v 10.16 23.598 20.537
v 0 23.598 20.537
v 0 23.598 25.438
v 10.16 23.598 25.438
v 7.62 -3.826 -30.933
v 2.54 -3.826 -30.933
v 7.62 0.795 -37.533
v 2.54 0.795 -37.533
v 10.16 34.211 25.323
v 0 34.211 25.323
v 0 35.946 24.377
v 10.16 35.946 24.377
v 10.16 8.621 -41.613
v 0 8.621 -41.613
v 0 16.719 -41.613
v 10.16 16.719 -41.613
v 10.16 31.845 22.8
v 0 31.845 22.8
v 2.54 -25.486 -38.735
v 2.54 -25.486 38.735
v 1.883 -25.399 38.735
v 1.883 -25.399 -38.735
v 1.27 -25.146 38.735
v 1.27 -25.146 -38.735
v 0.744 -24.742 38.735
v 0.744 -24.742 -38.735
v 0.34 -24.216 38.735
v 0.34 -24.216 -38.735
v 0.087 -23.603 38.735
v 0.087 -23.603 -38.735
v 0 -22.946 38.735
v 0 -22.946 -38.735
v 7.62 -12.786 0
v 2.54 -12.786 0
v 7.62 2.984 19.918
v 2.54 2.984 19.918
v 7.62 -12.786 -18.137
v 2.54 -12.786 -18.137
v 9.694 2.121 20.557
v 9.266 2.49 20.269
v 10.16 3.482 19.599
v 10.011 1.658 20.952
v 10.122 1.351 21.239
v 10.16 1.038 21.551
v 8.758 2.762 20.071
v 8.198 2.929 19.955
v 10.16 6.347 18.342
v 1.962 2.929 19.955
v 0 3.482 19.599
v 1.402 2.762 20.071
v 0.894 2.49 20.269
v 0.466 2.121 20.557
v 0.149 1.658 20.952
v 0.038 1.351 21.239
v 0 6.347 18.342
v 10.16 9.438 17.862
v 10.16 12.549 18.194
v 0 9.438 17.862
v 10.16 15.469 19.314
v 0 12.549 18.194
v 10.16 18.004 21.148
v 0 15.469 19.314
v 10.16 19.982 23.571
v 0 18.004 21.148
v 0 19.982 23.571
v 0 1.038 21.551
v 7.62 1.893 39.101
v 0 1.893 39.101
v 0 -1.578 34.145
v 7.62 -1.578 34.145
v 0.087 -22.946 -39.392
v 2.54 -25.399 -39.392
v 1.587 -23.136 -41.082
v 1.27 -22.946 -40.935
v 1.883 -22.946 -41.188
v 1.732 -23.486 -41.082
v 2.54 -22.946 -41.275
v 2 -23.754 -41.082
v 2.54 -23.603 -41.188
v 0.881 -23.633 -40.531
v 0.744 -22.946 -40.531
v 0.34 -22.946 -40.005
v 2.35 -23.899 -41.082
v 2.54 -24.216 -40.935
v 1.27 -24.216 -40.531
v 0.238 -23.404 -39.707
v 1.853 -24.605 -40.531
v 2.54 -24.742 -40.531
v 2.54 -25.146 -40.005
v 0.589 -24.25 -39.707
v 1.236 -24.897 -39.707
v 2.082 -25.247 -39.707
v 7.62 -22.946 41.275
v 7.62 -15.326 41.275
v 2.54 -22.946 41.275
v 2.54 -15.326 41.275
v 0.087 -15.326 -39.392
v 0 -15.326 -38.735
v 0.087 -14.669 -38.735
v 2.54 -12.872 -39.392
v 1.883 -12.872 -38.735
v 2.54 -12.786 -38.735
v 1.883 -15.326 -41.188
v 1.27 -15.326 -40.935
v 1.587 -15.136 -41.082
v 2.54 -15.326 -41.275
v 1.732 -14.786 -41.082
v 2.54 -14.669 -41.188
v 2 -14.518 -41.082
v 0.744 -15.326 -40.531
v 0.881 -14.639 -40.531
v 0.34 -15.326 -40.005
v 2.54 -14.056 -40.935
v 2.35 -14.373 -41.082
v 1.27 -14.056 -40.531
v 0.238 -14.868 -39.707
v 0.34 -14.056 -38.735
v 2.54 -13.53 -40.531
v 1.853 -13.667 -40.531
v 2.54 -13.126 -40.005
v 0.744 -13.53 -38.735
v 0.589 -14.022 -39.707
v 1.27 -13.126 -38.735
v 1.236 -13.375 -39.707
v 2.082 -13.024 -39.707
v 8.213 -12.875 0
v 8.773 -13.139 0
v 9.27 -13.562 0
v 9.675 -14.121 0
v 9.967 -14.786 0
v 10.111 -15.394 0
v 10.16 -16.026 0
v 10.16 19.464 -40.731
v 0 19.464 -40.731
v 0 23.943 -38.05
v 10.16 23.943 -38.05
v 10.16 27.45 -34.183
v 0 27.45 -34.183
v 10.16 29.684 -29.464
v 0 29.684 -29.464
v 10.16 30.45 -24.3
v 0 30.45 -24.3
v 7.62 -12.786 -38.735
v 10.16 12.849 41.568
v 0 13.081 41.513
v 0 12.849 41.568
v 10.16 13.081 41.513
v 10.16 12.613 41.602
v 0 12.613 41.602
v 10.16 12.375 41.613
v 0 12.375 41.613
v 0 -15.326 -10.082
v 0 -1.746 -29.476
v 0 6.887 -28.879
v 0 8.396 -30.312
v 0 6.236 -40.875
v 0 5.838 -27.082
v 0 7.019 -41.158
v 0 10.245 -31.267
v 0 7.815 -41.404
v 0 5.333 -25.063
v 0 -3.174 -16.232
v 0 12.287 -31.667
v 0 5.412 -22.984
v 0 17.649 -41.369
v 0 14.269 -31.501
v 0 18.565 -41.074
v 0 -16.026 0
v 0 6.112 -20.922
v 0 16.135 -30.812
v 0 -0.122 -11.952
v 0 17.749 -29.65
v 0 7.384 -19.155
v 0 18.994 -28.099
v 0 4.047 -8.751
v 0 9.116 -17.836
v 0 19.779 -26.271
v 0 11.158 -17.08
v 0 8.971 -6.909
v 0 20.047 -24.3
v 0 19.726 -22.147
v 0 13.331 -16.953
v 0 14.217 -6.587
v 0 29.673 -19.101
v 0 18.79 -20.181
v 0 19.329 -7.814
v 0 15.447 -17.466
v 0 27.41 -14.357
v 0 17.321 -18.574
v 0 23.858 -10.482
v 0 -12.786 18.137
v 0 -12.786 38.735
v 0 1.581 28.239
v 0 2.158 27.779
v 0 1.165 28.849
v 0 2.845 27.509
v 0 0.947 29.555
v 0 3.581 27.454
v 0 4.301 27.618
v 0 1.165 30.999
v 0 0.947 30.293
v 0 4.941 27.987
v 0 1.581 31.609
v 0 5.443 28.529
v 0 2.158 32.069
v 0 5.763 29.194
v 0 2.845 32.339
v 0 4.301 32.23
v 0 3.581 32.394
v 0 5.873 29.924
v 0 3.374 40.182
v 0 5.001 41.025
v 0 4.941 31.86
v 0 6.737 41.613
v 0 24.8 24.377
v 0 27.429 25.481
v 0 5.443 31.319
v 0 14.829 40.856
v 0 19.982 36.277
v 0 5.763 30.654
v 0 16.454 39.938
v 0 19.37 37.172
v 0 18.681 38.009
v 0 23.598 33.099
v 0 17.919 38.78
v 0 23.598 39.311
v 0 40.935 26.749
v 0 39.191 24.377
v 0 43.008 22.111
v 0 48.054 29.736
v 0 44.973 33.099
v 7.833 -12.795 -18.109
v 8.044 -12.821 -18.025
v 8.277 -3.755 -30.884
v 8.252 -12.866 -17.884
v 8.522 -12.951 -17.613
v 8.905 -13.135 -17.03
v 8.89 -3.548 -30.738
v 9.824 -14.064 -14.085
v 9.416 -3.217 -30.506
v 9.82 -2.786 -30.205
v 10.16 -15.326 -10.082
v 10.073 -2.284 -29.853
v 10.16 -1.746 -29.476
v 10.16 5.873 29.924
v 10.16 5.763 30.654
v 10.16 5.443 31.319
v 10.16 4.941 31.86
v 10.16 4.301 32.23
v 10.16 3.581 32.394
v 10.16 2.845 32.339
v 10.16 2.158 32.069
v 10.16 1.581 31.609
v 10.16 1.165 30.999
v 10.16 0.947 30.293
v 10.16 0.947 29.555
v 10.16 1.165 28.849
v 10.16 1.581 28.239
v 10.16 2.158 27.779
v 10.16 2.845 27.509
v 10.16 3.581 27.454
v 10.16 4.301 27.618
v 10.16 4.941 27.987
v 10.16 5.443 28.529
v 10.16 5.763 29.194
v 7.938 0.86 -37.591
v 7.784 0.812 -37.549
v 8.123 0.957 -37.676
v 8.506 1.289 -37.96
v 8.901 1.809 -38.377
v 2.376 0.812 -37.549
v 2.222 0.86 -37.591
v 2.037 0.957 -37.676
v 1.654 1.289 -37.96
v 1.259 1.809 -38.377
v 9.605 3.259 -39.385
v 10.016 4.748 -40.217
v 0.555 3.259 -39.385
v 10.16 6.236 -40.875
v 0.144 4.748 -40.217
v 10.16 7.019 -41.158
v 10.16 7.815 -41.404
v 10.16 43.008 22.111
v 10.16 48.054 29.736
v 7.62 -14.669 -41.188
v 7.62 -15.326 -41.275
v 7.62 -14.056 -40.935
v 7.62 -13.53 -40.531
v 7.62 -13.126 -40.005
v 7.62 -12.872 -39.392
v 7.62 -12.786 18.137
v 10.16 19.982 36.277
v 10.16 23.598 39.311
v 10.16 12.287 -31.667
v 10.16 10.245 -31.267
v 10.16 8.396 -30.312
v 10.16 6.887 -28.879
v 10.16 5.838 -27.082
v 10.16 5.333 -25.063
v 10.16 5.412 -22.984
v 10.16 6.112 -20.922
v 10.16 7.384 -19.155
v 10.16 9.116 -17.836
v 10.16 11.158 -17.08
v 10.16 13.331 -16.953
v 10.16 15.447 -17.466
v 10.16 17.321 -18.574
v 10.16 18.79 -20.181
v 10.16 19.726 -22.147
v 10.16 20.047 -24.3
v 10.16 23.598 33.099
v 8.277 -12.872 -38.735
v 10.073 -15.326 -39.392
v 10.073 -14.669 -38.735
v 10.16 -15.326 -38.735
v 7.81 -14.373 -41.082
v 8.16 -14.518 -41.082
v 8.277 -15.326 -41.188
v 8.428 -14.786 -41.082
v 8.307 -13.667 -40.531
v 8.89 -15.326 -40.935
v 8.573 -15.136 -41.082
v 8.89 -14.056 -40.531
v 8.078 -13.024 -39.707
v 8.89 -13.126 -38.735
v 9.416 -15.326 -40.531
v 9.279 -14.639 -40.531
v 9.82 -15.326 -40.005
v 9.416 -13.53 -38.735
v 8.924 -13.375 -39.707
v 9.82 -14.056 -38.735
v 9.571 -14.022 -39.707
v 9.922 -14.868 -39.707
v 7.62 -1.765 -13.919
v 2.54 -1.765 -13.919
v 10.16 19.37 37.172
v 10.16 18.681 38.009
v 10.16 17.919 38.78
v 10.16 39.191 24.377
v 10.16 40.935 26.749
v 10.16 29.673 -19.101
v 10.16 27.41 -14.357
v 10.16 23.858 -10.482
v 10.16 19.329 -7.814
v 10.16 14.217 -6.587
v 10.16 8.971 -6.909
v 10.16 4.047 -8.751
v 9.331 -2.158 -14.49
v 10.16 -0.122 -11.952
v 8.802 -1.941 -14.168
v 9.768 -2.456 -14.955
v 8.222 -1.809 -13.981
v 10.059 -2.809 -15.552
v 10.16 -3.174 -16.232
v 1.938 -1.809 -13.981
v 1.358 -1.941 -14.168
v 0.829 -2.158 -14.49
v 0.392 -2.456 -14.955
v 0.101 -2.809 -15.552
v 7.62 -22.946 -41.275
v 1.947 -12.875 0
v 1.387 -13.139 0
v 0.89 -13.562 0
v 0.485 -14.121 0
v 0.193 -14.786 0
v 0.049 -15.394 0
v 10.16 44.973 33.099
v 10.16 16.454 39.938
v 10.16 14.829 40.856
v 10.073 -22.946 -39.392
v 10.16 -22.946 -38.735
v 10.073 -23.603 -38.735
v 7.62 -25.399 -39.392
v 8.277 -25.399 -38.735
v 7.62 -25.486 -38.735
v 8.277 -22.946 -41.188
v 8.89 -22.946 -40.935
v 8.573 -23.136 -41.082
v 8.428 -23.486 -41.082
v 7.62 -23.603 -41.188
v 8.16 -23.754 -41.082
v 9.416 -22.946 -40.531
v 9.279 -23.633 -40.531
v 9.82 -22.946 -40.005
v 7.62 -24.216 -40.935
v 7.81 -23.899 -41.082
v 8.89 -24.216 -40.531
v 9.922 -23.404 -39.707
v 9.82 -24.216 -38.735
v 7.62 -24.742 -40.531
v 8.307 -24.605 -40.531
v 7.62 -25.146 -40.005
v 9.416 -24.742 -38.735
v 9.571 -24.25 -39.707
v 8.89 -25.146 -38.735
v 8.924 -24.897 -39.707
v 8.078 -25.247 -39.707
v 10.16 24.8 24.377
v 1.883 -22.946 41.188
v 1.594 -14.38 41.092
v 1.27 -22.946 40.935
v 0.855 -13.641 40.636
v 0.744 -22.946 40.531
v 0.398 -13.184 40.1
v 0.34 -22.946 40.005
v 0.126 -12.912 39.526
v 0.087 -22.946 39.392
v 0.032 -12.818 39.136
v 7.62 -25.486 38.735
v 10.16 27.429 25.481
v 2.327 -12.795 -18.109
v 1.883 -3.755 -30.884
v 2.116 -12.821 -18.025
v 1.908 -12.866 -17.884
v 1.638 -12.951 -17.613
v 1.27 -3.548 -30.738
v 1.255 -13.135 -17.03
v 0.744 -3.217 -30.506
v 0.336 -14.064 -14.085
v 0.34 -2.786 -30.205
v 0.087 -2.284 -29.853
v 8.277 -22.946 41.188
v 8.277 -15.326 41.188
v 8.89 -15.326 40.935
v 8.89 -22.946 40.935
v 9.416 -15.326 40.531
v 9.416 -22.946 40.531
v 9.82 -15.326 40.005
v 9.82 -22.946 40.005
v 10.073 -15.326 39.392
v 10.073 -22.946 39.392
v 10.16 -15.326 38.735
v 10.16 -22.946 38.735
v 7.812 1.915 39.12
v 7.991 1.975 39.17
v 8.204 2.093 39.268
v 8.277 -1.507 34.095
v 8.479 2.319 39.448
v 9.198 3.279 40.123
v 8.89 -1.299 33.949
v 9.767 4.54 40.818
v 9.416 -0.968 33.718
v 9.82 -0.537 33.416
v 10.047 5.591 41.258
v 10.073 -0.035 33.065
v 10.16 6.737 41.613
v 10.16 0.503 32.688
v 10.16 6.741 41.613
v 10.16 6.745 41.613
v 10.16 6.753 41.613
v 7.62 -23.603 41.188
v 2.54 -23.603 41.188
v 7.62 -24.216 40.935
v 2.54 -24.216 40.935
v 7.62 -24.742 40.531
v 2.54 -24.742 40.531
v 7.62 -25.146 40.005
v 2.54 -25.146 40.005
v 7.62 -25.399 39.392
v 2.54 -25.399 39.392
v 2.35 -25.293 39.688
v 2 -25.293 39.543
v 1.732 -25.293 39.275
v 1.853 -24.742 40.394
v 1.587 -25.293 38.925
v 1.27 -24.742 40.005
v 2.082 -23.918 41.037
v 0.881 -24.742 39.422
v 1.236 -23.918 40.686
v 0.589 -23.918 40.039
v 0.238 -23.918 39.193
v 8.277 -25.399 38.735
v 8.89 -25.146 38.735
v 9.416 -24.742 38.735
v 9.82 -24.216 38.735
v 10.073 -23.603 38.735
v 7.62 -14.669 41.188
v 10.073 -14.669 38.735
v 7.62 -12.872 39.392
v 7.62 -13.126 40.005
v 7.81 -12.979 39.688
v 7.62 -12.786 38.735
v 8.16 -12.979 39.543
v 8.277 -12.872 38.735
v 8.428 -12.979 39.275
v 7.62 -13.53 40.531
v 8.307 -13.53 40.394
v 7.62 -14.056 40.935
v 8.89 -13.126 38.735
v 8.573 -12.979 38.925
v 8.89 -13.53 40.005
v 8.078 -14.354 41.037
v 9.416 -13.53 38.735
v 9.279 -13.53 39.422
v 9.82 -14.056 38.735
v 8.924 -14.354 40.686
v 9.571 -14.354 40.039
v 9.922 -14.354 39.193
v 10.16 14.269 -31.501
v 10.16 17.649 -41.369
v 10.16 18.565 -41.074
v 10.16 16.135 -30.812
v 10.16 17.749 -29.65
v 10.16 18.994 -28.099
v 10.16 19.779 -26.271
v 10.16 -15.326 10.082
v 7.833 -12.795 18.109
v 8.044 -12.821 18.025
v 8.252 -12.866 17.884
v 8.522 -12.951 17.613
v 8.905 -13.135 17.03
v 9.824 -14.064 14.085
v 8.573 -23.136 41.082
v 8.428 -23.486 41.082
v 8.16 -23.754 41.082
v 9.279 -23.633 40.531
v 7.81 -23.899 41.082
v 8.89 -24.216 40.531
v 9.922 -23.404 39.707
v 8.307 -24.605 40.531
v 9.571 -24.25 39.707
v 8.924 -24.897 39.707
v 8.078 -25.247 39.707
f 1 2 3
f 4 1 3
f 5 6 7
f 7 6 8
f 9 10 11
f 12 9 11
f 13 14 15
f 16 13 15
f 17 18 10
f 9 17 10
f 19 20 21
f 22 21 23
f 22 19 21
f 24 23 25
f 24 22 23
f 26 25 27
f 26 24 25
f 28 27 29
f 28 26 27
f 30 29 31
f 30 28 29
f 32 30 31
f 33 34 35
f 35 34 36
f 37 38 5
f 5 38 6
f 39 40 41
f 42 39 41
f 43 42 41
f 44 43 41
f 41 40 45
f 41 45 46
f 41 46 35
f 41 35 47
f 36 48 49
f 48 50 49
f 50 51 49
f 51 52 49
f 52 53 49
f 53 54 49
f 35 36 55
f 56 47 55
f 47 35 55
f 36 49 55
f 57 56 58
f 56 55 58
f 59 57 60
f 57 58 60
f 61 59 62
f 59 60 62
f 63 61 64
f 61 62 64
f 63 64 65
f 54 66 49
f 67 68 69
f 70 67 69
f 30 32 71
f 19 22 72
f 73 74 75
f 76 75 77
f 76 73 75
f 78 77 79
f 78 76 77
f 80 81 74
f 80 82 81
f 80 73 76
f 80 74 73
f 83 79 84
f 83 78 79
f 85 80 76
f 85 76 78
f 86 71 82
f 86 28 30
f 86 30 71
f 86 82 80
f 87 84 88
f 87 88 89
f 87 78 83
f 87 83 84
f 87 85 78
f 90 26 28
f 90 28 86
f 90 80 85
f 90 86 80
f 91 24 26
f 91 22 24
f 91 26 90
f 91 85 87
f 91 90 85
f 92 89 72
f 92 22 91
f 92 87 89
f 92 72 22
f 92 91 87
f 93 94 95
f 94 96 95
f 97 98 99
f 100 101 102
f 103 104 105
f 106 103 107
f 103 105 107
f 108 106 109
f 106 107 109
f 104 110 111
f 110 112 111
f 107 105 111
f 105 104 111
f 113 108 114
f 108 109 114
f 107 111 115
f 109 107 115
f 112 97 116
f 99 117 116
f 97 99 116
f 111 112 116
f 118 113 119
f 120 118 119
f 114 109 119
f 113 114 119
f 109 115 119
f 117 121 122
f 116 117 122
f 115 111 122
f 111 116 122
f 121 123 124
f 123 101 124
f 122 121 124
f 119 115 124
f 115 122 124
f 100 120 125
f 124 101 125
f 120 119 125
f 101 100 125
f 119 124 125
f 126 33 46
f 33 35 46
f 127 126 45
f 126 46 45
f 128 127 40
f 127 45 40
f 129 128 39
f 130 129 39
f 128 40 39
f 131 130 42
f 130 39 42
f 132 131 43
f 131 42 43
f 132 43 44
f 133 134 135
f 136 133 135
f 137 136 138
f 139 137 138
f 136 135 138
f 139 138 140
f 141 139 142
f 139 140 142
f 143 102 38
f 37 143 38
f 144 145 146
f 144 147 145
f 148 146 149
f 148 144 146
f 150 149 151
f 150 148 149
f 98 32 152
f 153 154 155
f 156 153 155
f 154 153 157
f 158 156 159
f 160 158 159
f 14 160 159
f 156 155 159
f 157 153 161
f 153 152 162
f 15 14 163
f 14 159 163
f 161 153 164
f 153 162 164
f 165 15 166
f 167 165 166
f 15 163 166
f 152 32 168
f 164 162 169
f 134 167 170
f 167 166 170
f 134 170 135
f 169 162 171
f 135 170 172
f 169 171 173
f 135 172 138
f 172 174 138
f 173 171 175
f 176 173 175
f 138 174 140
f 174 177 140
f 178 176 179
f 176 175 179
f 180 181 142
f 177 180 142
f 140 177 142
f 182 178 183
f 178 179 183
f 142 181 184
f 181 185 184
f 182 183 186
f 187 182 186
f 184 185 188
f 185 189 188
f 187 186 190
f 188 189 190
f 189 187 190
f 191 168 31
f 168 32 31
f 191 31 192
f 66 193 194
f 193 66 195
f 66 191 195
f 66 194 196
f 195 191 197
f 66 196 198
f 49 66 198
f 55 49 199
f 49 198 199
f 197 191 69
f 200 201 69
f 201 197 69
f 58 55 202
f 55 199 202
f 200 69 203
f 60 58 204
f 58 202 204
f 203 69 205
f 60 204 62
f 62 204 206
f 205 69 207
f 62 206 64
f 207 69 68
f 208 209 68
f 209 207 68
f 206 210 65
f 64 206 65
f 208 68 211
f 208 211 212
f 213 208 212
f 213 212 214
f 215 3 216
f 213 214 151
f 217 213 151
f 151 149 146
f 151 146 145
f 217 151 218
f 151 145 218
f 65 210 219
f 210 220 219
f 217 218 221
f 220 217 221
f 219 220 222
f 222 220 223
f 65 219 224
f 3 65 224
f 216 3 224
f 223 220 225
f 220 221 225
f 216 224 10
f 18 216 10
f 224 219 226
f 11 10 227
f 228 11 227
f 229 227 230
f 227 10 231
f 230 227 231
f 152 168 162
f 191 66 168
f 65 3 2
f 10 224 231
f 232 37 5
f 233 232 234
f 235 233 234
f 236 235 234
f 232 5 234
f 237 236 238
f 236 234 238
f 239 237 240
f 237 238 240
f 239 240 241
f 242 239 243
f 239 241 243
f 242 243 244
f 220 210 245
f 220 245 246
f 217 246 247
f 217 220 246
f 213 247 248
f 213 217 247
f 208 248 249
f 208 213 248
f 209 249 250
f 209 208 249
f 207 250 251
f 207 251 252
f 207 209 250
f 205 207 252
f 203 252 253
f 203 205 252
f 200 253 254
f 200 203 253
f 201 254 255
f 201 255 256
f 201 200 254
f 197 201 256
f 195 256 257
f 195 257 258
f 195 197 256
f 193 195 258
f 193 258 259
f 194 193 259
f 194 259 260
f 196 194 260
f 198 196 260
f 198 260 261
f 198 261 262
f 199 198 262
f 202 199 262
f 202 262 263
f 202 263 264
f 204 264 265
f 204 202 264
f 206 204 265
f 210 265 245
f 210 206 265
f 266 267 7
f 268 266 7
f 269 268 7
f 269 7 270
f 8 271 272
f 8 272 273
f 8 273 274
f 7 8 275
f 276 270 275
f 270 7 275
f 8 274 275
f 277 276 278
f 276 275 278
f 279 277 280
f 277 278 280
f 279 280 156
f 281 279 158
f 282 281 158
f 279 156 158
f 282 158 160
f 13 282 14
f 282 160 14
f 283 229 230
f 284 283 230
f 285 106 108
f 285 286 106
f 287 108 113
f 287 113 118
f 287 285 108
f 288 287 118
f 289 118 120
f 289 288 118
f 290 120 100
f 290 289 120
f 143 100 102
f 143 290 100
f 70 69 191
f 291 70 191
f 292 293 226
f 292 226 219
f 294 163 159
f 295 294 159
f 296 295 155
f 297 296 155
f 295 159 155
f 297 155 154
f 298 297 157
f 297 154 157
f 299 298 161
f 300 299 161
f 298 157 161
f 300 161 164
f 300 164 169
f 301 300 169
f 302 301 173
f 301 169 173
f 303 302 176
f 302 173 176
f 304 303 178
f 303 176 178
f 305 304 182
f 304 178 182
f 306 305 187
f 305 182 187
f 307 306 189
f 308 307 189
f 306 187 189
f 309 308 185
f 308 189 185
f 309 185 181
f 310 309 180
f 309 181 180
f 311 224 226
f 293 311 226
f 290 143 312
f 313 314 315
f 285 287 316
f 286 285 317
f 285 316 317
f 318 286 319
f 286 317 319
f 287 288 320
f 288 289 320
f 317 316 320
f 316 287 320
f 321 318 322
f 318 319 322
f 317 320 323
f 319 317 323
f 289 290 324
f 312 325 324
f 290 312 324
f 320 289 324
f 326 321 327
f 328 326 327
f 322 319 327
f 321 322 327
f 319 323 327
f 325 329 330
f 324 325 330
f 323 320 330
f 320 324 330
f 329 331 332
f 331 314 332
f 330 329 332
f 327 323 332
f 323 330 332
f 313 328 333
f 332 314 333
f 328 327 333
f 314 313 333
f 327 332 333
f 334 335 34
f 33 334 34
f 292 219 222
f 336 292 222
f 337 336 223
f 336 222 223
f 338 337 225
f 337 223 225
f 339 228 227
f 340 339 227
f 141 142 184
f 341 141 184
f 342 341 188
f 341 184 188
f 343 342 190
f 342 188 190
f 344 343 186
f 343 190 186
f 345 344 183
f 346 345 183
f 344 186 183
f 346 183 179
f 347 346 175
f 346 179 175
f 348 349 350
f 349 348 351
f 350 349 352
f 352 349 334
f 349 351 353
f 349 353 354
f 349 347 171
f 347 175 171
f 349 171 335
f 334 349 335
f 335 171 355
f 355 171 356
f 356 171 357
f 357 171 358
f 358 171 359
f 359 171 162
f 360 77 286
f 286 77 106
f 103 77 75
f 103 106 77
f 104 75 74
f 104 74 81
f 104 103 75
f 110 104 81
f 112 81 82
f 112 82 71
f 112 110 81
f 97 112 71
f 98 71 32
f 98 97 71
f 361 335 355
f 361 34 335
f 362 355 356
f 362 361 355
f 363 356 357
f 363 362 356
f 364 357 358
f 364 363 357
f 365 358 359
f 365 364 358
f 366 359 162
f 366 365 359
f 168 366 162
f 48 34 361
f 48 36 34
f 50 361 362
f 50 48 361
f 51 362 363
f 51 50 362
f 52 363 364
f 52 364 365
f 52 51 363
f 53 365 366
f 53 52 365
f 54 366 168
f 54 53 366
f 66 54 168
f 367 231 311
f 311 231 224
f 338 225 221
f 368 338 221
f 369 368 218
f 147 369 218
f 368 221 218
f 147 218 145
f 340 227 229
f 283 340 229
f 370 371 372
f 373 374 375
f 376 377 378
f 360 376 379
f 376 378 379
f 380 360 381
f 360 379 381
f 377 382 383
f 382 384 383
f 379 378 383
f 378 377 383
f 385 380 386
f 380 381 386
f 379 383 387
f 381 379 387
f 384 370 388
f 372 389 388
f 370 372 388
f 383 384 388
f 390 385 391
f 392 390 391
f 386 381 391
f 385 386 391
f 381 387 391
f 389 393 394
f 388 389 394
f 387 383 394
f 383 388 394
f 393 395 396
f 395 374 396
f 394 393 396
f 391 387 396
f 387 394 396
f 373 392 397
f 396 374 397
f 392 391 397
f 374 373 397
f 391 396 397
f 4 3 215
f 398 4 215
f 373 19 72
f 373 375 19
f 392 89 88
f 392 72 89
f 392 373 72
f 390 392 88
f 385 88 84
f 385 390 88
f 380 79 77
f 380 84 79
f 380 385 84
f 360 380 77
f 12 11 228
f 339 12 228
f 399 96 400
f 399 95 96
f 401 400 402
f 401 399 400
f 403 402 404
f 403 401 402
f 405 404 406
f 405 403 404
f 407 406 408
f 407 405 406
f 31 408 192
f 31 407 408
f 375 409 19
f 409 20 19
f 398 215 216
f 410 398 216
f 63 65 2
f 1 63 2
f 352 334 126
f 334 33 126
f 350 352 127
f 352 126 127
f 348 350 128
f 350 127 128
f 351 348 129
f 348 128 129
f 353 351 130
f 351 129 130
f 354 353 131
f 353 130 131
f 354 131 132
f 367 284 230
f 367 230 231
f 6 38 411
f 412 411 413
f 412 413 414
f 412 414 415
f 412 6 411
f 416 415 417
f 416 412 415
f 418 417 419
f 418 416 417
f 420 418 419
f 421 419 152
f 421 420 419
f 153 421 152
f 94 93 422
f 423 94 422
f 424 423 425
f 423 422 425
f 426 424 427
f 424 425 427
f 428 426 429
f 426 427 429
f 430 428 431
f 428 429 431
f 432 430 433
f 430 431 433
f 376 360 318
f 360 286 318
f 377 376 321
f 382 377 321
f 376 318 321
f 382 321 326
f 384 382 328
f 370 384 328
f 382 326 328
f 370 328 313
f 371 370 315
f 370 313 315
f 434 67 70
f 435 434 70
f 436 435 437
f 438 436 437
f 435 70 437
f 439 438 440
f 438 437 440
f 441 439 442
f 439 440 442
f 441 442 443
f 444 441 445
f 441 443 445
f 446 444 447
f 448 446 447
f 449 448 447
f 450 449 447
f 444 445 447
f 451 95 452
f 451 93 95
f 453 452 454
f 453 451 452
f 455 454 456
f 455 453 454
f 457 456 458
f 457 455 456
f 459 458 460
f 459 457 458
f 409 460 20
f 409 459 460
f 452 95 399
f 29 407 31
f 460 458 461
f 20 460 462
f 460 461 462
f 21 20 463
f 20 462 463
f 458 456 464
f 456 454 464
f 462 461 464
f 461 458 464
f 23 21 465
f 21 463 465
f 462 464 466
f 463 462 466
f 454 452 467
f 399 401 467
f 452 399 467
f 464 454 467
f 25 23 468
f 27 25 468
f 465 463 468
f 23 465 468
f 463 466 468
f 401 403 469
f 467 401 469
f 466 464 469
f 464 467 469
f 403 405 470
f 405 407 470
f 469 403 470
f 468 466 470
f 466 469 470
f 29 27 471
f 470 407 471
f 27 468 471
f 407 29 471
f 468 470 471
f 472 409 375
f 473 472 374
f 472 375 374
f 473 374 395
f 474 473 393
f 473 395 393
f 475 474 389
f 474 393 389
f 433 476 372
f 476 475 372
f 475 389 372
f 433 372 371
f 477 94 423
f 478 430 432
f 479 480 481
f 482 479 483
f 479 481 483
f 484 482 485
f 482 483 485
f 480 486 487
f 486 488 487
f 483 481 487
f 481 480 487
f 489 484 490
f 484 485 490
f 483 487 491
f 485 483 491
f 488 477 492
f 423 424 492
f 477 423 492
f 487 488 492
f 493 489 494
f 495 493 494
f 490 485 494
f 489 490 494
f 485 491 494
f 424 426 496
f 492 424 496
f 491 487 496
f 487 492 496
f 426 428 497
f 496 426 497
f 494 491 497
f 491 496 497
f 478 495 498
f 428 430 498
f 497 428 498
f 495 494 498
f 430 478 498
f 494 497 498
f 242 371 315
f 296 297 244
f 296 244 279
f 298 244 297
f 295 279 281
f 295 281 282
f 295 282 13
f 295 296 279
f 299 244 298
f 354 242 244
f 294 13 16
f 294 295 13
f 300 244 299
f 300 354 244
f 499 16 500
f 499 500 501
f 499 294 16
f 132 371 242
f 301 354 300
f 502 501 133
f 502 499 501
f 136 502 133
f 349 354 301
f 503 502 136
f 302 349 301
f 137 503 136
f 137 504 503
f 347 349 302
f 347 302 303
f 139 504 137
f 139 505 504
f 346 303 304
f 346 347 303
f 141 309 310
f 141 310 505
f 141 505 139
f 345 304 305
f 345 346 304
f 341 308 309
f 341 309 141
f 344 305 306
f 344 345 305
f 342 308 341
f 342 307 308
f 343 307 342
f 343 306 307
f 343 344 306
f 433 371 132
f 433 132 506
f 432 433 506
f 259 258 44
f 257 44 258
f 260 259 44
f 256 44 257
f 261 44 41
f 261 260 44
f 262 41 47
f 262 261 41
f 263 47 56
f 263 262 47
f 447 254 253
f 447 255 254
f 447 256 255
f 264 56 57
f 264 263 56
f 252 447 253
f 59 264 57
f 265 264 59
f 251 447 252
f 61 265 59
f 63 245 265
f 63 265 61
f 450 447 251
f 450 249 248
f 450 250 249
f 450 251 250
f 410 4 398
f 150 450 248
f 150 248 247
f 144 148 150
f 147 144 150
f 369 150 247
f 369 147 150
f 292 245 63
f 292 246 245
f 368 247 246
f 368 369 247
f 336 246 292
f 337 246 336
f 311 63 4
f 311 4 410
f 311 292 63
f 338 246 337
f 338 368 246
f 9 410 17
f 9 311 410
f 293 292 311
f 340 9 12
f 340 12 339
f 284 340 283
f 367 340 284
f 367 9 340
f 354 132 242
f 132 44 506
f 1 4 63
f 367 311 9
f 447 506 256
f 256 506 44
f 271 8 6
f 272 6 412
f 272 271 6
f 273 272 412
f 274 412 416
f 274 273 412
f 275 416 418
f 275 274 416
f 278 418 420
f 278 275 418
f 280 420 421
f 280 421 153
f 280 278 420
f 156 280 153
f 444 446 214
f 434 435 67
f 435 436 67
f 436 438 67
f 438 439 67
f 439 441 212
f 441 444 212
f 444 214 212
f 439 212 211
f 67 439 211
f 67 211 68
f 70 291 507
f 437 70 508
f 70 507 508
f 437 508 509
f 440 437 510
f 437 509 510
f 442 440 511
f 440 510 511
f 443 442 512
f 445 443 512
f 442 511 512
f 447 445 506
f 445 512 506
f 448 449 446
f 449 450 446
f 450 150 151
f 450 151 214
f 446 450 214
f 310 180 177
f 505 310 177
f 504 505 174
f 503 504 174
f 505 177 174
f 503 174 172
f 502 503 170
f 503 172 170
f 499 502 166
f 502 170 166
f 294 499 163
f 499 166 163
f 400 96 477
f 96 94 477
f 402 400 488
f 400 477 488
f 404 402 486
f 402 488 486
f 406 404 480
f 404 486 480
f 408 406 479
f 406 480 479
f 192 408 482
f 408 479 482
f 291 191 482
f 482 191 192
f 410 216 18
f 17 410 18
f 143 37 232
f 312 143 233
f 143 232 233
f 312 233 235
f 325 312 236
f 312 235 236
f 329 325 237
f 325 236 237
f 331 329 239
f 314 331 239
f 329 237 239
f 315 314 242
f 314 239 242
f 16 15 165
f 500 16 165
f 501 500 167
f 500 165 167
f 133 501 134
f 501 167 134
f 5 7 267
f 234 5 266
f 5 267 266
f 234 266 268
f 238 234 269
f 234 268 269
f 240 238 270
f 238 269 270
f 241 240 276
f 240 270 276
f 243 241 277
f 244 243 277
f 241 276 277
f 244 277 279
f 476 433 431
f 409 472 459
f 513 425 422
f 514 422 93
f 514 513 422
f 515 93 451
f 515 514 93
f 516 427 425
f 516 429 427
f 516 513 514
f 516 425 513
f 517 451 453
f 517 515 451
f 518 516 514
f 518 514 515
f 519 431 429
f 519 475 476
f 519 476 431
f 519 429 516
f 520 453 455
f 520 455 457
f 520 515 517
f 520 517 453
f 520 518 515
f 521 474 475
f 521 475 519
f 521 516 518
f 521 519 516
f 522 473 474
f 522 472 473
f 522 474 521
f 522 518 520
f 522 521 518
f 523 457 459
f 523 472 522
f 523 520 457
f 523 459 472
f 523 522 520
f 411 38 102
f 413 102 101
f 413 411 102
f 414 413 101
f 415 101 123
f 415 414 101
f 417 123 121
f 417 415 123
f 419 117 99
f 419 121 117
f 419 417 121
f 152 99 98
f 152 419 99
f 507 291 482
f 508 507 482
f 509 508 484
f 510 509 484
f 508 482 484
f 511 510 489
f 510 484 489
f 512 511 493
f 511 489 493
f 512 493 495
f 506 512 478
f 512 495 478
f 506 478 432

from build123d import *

# Parameters (mm, degrees)
F0_R     = 2.476830384
F0_W     = 1.4847664508
F0_H     = 6.35
F1_DEPTH = 10.16
F2_R     = 2.54


with BuildPart() as f1:
    # F0 (on Right) → F1 (new body)
    with BuildSketch(Plane.YZ):
        Polygon((-12.7859174941, 41.275), (-25.4859174941, 41.275), (-25.4859174941, 0), (-12.7859174941, 18.1374796856), align=None)
        Polygon((-12.7859174941, 18.1374796856), (-25.4859174941, 0), (-12.7859174941, -18.1374796856), (-12.7859174941, 0), align=None)
        with BuildLine():
            Line((-12.7859174941, 0), (-12.7859174941, -18.1374796856))
            Line((-12.7859174941, -18.1374796856), (-3.8262820868, -30.9331651338))
            ThreePointArc((-3.8262820868, -30.9331651338), (-4.9808453905, -22.1615497886), (-1.7649908775, -13.9194304048))
            Line((-1.7649908775, -13.9194304048), (-12.7859174941, 0))
        make_face()
        Polygon((-12.7859174941, -18.1374796856), (-25.4859174941, 0), (-25.4859174941, -41.275), (-12.7859174941, -41.275), align=None)
        with BuildLine():
            ThreePointArc((-1.7649908775, -13.9194304048), (-4.9808453905, -22.1615497886), (-3.8262820868, -30.9331651338))
            Line((-3.8262820868, -30.9331651338), (0.7948947361, -37.5328896022))
            ThreePointArc((0.7948947361, -37.5328896022), (4.4509166454, -40.0662604083), (8.6213238247, -41.6129238499))
            Line((8.6213238247, -41.6129238499), (16.7188414486, -41.6129238499))
            ThreePointArc((16.7188414486, -41.6129238499), (18.1090826399, -41.2277000329), (19.4635172648, -40.731036358))
            Line((19.4635172648, -40.731036358), (12.2868024965, -31.6668455484))
            ThreePointArc((12.2868024965, -31.6668455484), (6.8866357903, -28.8791743085), (5.4117238908, -22.9836212144))
            Line((5.4117238908, -22.9836212144), (-1.7649908775, -13.9194304048))
        make_face()
        with BuildLine():
            ThreePointArc((30.4500826367, -24.300039859), (18.1231915168, -7.3769194747), (-1.7649908775, -13.9194304048))
            Line((-1.7649908775, -13.9194304048), (5.4117238908, -22.9836212144))
            ThreePointArc((5.4117238908, -22.9836212144), (13.3309493362, -16.9529326094), (20.0468522367, -24.300039859))
            ThreePointArc((20.0468522367, -24.300039859), (17.7489289843, -29.6499977568), (12.2868024965, -31.6668455484))
            Line((12.2868024965, -31.6668455484), (19.4635172648, -40.731036358))
            ThreePointArc((19.4635172648, -40.731036358), (27.4504017754, -34.182881867), (30.4500826367, -24.300039859))
        make_face()
        with BuildLine():
            Line((-1.5775528515, 34.1446833088), (-12.7859174941, 18.1374796856))
            Line((-12.7859174941, 18.1374796856), (-12.7859174941, 0))
            Line((-12.7859174941, 0), (2.9841893191, 19.9176450311))
            ThreePointArc((2.9841893191, 19.9176450311), (-1.763802881, 26.2401091232), (-1.5775528515, 34.1446833088))
        make_face()
        with BuildLine():
            Line((17.9186733985, 38.7798985425), (2.9841893191, 19.9176450311))
            ThreePointArc((2.9841893191, 19.9176450311), (12.2603418149, 18.1282692763), (19.9820541252, 23.5710654062))
            Line((19.9820541252, 23.5710654062), (19.9820541252, 36.2767071198))
            ThreePointArc((19.9820541252, 36.2767071198), (19.0348785601, 37.5979683806), (17.9186733985, 38.7798985425))
        make_face()
        with BuildLine():
            Line((1.8930880599, 39.1012722086), (-1.5775528515, 34.1446833088))
            ThreePointArc((-1.5775528515, 34.1446833088), (-1.763802881, 26.2401091232), (2.9841893191, 19.9176450311))
            Line((2.9841893191, 19.9176450311), (17.9186733985, 38.7798985425))
            ThreePointArc((17.9186733985, 38.7798985425), (15.4927249878, 40.5209748262), (12.7134769516, 41.6129238499))
            Line((12.7134769516, 41.6129238499), (6.7366465898, 41.6129238499))
            ThreePointArc((6.7366465898, 41.6129238499), (4.171026982, 40.6344848722), (1.8930880599, 39.1012722086))
        make_face()
        with Locations((3.3962282663, 29.923886263)):
            Circle(F0_R, mode=Mode.SUBTRACT)
        Polygon((23.5980694161, 39.3109042168), (19.9820541252, 36.2767071198), (23.5980694161, 36.2767071198), align=None)
        with BuildLine():
            ThreePointArc((21.7900617707, 29.923886263), (21.3292601006, 26.6213408627), (19.9820541252, 23.5710654062))
            Line((19.9820541252, 23.5710654062), (23.5980694161, 23.5710654062))
            Line((23.5980694161, 23.5710654062), (23.5980694161, 25.4382899789))
            Line((23.5980694161, 25.4382899789), (22.1133029653, 26.748886263))
            Line((22.1133029653, 26.748886263), (22.1133029653, 33.098886263))
            Line((22.1133029653, 33.098886263), (23.5980694161, 33.098886263))
            Line((23.5980694161, 33.098886263), (23.5980694161, 36.2767071198))
            Line((23.5980694161, 36.2767071198), (19.9820541252, 36.2767071198))
            ThreePointArc((19.9820541252, 36.2767071198), (21.3292601006, 33.2264316634), (21.7900617707, 29.923886263))
        make_face()
        with BuildLine():
            Line((19.9820541252, 36.2767071198), (19.9820541252, 23.5710654062))
            ThreePointArc((19.9820541252, 23.5710654062), (21.3292601006, 26.6213408627), (21.7900617707, 29.923886263))
            ThreePointArc((21.7900617707, 29.923886263), (21.3292601006, 33.2264316634), (19.9820541252, 36.2767071198))
        make_face()
        with Locations((22.8556861907, 29.923886263)):
            Rectangle(F0_W, F0_H)
        Polygon((22.1133029653, 26.748886263), (23.5980694161, 25.4382899789), (23.5980694161, 26.748886263), align=None)
        Polygon((23.5980694161, 23.5710654062), (19.9820541252, 23.5710654062), (23.5980694161, 20.5368683093), align=None)
        Polygon((44.9733029653, 33.098886263), (23.5980694161, 33.098886263), (23.5980694161, 26.748886263), (40.9346896774, 26.748886263), (44.9733029653, 26.748886263), align=None)
        Polygon((23.5980694161, 26.748886263), (23.5980694161, 25.4382899789), (24.8001961815, 24.3771784008), (27.4288224834, 25.4811998457), (31.844913851, 22.8000022471), (34.2106743562, 25.3234822303), (35.9455681252, 24.3771784008), (39.1914657905, 24.3771784008), (40.9346896774, 26.748886263), align=None)
        Polygon((48.0538682116, 29.7363082874), (44.9733029653, 33.098886263), (44.9733029653, 26.748886263), (40.9346896774, 26.748886263), (43.0080477987, 22.1112590571), align=None)
    extrude(amount=F1_DEPTH)

    # F2
    f2_edges = [f1.edges().sort_by_distance(p)[0] for p in [
        (10.16, -25.485917, 0),
        (10.16, -19.135917, 41.275),
        (5.08, -12.785917, 41.275),
        (0, -19.135917, 41.275),
        (5.08, -25.485917, 41.275),
        (0, -25.485917, 0),
        (10.16, -5.446415, 28.619376),
        (10.16, -12.785917, 29.70624),
        (10.16, -4.900864, 9.958823),
        (0, -4.900864, 9.958823),
        (10.16, -7.275454, -6.959715),
        (0, -7.275454, -6.959715),
        (10.16, -12.785917, -29.70624),
        (0, -12.785917, -29.70624),
        (0, -19.135917, -41.275),
        (5.08, -12.785917, -41.275),
        (10.16, -19.135917, -41.275),
        (5.08, -25.485917, -41.275),
        (5.08, 12.713477, 41.612924),
        (10.16, -5.995511, -27.835185),
        (0, -5.995511, -27.835185),
    ]]
    fillet(f2_edges, radius=F2_R)


solid = f1.part
